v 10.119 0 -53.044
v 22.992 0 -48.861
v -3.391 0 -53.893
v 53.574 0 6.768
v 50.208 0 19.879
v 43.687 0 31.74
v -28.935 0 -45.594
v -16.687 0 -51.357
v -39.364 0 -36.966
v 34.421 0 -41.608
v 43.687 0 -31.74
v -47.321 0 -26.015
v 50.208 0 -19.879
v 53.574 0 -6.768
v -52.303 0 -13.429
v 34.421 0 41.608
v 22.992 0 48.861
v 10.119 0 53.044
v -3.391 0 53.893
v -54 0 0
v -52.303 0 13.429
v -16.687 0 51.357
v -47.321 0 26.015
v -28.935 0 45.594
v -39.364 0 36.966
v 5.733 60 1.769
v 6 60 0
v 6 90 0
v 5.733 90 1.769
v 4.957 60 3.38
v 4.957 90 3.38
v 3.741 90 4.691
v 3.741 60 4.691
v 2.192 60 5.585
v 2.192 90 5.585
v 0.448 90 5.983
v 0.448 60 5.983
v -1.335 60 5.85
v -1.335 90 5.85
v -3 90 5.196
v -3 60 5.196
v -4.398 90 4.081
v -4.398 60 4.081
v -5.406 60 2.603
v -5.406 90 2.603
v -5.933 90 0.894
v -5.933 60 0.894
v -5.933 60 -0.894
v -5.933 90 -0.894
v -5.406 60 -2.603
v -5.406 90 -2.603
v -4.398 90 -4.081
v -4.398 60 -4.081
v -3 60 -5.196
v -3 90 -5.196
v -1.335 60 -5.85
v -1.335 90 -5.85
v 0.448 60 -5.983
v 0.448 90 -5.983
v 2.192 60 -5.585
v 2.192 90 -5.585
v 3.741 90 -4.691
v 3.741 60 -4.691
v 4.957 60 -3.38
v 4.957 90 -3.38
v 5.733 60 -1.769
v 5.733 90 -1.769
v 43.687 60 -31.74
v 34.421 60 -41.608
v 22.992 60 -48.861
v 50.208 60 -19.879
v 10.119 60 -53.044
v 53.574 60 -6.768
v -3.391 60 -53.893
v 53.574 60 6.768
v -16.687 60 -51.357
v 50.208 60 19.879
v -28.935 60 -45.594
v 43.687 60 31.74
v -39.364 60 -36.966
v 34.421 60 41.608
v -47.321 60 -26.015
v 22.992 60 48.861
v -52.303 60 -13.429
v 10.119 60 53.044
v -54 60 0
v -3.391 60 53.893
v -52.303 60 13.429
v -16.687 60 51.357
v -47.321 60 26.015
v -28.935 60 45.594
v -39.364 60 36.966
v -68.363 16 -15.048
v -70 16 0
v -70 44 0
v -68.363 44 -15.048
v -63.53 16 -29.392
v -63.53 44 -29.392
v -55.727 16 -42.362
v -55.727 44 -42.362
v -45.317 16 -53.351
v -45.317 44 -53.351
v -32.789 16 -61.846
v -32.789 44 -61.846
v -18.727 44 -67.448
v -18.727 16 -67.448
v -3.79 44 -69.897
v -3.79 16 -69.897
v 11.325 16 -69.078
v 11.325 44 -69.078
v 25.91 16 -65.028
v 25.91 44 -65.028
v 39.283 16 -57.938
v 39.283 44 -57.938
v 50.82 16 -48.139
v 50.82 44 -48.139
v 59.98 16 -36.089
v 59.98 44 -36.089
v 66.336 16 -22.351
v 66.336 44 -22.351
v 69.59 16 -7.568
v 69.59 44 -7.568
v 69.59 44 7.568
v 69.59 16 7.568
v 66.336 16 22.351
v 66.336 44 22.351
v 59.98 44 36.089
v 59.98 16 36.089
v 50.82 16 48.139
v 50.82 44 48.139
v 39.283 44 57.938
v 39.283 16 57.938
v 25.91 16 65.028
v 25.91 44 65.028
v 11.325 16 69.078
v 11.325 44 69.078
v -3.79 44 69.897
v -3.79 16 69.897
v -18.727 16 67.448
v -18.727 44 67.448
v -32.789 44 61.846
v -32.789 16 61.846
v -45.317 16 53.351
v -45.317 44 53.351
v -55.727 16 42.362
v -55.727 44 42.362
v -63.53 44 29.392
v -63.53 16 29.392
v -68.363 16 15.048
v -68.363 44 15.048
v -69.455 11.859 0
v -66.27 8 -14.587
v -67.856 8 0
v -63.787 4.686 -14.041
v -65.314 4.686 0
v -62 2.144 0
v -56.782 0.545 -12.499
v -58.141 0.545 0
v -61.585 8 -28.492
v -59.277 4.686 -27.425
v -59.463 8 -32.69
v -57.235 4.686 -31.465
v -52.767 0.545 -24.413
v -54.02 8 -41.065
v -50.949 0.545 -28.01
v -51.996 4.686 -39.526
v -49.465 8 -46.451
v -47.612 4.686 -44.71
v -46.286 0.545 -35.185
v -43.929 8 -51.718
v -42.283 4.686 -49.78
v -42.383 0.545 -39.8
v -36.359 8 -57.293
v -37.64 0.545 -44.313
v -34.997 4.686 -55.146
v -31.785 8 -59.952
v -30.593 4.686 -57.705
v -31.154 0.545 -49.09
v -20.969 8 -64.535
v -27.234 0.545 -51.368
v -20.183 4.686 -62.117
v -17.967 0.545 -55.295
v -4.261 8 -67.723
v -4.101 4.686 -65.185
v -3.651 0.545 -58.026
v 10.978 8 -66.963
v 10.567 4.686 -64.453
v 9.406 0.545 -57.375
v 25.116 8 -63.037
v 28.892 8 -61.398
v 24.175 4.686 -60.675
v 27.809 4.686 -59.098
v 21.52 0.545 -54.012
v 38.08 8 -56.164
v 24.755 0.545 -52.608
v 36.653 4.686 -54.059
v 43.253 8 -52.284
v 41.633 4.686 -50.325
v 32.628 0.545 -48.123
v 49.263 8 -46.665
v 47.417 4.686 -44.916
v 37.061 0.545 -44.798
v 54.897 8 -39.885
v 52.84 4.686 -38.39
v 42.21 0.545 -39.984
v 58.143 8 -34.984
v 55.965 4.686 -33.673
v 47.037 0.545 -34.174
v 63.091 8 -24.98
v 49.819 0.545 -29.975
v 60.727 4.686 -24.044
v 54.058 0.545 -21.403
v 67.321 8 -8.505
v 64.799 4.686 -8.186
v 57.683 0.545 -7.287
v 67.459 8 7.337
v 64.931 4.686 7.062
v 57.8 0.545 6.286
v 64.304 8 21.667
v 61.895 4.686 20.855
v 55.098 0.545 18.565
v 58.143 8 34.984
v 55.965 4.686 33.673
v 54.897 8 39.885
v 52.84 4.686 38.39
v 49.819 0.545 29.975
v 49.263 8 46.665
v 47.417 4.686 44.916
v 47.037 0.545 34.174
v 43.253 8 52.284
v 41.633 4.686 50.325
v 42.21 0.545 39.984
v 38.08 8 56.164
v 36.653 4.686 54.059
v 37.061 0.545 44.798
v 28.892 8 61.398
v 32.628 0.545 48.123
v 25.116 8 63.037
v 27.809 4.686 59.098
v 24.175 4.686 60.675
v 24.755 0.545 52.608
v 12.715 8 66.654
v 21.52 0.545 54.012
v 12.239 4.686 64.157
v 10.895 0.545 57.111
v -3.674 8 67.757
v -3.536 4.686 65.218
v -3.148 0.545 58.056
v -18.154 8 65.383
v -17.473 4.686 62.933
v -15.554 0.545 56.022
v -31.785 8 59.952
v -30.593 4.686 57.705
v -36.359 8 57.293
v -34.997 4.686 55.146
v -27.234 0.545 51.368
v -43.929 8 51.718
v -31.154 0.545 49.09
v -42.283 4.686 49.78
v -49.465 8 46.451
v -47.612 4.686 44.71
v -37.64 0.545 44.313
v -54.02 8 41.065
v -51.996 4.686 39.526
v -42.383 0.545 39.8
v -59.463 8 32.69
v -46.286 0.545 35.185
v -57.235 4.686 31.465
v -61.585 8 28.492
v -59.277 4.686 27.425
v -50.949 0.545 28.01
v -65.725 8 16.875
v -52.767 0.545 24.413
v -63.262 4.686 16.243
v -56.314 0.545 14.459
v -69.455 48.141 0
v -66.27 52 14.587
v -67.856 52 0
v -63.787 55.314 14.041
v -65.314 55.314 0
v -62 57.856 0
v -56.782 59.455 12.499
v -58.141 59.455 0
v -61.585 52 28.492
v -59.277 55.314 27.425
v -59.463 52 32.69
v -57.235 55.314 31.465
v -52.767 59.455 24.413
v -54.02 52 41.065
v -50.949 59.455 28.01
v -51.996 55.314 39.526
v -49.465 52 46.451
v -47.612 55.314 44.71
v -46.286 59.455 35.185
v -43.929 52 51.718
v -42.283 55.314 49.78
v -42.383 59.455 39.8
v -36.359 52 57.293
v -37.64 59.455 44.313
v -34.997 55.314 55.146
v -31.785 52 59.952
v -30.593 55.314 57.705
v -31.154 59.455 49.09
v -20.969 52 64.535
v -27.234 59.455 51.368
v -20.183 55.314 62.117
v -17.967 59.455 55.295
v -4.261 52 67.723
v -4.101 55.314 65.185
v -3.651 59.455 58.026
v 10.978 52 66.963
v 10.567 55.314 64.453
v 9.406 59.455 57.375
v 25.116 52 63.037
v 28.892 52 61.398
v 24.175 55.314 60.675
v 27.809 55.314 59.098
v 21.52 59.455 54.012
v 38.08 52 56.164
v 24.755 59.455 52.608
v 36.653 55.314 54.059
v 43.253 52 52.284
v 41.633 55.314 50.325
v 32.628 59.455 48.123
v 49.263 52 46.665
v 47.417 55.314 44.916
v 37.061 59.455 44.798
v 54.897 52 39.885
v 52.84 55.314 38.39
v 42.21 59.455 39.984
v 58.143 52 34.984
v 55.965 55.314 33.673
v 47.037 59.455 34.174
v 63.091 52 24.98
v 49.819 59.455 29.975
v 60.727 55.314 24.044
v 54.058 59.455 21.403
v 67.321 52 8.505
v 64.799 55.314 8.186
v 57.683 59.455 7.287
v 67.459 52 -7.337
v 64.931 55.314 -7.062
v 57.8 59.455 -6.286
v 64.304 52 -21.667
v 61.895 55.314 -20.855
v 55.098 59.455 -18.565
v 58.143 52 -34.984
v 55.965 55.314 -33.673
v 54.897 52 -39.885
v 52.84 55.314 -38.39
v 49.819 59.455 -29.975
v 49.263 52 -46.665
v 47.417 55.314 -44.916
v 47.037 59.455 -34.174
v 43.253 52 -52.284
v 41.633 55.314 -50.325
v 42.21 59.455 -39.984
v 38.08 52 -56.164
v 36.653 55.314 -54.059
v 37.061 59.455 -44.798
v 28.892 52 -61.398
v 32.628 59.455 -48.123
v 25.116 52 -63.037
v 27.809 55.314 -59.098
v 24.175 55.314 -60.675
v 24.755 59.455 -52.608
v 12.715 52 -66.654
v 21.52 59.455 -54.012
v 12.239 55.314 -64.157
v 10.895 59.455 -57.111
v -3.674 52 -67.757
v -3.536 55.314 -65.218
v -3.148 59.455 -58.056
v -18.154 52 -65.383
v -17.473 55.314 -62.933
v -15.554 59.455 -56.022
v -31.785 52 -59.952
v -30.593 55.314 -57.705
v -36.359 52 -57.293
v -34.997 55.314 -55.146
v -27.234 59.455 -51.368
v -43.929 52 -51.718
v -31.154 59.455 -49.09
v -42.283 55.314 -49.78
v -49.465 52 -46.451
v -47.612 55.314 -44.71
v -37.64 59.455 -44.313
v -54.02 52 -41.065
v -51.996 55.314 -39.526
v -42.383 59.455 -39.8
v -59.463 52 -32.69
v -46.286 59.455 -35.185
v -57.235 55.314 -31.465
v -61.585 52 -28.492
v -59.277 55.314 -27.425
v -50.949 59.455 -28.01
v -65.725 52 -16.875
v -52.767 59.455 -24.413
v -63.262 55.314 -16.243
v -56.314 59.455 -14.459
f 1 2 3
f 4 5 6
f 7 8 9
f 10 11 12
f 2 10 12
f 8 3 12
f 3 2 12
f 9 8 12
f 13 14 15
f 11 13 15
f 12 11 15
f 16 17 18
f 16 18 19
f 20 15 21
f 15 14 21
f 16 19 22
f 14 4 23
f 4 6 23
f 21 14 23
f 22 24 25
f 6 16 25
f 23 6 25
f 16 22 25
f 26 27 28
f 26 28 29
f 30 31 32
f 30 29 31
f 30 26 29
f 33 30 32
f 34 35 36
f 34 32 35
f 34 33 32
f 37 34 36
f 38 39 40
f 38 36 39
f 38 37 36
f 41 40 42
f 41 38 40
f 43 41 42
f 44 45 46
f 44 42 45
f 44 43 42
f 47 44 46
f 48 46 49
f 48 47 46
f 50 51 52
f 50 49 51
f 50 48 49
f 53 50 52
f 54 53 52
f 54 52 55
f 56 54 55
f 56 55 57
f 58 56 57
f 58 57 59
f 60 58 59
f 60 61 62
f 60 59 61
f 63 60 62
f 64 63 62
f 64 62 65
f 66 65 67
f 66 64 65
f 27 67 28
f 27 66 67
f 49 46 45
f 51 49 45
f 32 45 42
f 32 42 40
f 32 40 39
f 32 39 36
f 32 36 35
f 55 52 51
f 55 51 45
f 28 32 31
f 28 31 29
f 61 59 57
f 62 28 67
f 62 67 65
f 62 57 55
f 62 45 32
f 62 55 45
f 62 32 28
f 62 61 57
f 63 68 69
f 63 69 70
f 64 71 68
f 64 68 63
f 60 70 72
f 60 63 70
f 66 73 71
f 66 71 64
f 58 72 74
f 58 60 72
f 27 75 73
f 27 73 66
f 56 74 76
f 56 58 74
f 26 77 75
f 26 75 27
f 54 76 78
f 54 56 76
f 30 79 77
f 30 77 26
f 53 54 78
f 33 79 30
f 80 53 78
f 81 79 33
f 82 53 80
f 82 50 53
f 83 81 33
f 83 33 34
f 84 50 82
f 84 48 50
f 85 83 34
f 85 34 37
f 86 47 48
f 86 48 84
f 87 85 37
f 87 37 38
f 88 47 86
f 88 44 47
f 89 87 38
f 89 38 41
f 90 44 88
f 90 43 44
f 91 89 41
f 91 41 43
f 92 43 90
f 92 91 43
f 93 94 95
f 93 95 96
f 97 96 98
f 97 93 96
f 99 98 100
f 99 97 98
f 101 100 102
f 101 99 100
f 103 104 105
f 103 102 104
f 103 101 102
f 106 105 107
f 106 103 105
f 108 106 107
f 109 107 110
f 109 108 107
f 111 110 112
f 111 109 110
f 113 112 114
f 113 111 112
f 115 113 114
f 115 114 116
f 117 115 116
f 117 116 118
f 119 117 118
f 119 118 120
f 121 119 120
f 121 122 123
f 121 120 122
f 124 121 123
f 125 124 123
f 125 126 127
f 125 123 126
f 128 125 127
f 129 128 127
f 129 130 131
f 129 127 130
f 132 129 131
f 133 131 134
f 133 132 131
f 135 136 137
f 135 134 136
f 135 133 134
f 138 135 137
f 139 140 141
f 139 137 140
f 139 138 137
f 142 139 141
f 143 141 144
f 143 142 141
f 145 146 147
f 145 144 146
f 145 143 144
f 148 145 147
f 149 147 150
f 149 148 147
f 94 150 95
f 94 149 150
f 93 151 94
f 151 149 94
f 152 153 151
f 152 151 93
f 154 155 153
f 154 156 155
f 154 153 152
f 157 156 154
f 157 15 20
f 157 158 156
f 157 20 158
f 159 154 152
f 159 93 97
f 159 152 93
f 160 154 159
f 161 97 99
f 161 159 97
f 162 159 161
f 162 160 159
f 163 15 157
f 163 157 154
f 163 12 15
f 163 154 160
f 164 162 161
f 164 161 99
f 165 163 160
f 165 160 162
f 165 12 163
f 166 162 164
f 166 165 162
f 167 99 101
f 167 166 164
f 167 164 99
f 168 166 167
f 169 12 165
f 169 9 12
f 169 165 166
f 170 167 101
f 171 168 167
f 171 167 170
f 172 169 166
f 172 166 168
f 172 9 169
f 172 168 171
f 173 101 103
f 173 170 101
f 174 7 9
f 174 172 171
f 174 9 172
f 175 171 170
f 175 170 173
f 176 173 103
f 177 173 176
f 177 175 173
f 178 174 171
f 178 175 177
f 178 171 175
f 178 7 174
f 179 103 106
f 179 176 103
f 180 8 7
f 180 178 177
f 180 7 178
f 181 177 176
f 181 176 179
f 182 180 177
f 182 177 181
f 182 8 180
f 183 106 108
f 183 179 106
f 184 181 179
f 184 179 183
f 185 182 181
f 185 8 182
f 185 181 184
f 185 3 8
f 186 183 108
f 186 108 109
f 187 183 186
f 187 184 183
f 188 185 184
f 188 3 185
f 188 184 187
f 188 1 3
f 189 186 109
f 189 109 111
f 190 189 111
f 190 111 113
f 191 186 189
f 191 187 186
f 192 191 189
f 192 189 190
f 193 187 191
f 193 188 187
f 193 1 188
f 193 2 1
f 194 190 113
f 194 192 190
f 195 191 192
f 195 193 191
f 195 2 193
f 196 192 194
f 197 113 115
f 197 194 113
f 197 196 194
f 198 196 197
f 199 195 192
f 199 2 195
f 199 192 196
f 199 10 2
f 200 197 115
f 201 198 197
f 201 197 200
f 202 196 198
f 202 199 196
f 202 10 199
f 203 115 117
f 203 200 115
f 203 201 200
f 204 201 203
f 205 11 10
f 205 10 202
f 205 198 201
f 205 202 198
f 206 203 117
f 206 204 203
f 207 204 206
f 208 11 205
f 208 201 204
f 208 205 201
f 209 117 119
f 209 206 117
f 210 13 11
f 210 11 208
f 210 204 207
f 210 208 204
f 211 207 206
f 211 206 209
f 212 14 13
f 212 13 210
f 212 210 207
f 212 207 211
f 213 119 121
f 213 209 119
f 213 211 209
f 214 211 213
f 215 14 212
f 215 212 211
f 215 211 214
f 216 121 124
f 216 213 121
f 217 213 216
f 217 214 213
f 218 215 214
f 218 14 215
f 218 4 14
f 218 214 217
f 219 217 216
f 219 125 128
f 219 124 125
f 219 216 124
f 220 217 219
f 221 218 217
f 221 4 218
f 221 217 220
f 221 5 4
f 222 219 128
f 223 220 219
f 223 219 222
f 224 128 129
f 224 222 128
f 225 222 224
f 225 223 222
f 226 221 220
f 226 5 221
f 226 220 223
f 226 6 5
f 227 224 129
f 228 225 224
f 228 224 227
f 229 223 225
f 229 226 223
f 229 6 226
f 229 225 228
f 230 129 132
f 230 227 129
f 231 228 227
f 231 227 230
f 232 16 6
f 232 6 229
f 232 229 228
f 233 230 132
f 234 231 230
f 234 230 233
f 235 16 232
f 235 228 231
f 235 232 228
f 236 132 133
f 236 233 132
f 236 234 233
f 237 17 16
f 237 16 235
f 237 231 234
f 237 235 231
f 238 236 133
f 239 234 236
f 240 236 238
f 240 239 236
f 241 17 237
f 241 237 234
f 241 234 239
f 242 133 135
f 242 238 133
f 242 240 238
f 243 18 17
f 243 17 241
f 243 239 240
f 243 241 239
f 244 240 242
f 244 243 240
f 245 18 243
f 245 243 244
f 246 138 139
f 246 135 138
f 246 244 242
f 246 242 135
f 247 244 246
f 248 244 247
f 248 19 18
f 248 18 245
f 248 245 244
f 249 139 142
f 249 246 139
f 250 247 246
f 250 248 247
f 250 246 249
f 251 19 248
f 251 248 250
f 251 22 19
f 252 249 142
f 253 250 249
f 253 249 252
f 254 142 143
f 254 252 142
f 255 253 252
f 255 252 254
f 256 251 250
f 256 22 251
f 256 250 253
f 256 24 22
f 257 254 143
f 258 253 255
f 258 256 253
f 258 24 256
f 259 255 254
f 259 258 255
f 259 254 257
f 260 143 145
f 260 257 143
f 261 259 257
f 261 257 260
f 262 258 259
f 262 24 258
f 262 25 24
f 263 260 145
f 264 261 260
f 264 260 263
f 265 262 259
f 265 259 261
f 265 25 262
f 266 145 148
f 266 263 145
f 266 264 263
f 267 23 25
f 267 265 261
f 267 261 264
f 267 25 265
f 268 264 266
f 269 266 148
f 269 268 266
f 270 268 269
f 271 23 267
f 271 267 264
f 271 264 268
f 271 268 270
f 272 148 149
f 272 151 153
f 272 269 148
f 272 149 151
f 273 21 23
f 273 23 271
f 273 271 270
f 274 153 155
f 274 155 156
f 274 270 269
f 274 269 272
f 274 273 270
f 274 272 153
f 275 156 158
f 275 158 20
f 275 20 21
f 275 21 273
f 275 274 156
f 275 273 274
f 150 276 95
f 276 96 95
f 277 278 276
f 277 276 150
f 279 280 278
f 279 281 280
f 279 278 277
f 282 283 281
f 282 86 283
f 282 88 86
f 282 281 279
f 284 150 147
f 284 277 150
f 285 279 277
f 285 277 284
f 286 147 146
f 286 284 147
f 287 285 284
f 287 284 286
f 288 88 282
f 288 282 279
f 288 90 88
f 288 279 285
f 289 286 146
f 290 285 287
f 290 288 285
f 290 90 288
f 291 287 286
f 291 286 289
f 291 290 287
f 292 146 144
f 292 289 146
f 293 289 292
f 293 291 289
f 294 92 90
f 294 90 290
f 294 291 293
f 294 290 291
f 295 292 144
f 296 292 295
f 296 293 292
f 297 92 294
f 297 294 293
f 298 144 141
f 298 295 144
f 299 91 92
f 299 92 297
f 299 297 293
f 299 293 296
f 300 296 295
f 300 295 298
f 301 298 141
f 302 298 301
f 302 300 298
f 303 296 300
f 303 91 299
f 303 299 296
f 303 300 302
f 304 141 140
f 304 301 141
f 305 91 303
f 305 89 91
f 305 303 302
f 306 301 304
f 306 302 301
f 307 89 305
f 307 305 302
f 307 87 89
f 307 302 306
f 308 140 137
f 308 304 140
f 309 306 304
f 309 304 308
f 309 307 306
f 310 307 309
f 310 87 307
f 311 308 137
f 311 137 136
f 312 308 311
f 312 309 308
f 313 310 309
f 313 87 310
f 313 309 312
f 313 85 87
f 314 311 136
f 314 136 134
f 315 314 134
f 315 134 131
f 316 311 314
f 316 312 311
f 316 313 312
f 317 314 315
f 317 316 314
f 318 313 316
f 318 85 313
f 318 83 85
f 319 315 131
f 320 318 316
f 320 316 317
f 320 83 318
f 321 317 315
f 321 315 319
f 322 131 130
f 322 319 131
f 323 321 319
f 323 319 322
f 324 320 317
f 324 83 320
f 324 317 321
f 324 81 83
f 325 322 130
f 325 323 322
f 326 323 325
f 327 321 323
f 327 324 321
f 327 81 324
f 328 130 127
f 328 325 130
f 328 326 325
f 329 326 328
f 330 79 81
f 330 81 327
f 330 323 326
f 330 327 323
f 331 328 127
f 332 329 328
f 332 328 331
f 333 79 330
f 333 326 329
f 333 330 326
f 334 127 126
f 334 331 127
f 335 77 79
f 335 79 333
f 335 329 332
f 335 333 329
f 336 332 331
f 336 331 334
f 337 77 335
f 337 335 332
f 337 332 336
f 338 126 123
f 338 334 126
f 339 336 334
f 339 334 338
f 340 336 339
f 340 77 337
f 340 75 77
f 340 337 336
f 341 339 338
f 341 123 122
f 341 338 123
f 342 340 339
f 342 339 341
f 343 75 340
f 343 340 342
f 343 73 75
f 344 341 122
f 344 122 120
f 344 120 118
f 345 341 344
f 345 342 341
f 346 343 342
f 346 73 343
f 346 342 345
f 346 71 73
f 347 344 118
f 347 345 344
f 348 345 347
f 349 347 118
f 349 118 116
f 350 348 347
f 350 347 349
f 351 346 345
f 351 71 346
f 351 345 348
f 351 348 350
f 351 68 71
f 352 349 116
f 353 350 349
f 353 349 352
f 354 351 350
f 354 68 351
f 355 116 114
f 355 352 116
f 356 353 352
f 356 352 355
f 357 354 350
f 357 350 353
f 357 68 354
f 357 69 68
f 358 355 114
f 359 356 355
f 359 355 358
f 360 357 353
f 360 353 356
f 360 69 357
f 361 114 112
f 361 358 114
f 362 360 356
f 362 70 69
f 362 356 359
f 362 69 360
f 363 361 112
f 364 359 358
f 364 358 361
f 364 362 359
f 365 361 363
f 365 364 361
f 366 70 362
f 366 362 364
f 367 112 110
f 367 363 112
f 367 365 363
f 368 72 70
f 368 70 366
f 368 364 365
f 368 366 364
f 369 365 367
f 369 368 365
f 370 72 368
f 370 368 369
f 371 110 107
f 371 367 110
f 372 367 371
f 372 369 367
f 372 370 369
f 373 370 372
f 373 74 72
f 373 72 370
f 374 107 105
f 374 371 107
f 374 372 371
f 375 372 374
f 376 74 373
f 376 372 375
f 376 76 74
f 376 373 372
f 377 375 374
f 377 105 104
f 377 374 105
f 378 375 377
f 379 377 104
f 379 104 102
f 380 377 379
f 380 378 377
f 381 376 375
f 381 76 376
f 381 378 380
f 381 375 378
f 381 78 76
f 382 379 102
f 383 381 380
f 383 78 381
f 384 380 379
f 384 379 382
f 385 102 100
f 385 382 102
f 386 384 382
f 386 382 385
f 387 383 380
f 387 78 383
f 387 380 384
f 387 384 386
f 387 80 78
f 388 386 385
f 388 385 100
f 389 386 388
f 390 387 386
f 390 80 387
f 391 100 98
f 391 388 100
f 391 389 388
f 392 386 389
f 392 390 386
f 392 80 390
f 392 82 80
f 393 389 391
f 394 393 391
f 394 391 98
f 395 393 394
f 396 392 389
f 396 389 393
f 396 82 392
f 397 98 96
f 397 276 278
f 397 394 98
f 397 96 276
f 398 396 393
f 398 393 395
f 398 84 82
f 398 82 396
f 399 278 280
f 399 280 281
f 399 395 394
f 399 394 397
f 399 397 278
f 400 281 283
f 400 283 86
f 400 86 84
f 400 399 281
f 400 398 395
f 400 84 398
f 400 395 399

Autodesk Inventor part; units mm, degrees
ref_plane "YZ Plane" through (0, 0, 0) normal (1, 0, 0) x (0, 1, 0)
ref_plane "XZ Plane" through (0, 0, 0) normal (0, 1, 0) x (-1, 0, 0)
ref_plane "XY Plane" through (0, 0, 0) normal (0, 0, 1) x (1, 0, 0)
sketch "Sketch1" plane through (0, 0, 0) normal (0, 1, 0) x (-1, 0, 0)
  circle A0 centre (0, 0) radius 70
  dimension "d4" = 140
extrude "Extrusion1" add sketch "Sketch1" along normal blind 60
sketch "Sketch2" plane through (0, 60, 0) normal (0, 1, 0) x (1, 0, 0)
  circle A0 centre (0, 0) radius 70 construction
  circle A1 centre (0, 0) radius 6
  dimension "d5" = 12
extrude "Extrusion2" add sketch "Sketch2" along normal blind 30
fillet "Fillet1" radius 16 2 edges at (70, 60, 0) (70, 0, 0)
properties part number "GiroMotor"
